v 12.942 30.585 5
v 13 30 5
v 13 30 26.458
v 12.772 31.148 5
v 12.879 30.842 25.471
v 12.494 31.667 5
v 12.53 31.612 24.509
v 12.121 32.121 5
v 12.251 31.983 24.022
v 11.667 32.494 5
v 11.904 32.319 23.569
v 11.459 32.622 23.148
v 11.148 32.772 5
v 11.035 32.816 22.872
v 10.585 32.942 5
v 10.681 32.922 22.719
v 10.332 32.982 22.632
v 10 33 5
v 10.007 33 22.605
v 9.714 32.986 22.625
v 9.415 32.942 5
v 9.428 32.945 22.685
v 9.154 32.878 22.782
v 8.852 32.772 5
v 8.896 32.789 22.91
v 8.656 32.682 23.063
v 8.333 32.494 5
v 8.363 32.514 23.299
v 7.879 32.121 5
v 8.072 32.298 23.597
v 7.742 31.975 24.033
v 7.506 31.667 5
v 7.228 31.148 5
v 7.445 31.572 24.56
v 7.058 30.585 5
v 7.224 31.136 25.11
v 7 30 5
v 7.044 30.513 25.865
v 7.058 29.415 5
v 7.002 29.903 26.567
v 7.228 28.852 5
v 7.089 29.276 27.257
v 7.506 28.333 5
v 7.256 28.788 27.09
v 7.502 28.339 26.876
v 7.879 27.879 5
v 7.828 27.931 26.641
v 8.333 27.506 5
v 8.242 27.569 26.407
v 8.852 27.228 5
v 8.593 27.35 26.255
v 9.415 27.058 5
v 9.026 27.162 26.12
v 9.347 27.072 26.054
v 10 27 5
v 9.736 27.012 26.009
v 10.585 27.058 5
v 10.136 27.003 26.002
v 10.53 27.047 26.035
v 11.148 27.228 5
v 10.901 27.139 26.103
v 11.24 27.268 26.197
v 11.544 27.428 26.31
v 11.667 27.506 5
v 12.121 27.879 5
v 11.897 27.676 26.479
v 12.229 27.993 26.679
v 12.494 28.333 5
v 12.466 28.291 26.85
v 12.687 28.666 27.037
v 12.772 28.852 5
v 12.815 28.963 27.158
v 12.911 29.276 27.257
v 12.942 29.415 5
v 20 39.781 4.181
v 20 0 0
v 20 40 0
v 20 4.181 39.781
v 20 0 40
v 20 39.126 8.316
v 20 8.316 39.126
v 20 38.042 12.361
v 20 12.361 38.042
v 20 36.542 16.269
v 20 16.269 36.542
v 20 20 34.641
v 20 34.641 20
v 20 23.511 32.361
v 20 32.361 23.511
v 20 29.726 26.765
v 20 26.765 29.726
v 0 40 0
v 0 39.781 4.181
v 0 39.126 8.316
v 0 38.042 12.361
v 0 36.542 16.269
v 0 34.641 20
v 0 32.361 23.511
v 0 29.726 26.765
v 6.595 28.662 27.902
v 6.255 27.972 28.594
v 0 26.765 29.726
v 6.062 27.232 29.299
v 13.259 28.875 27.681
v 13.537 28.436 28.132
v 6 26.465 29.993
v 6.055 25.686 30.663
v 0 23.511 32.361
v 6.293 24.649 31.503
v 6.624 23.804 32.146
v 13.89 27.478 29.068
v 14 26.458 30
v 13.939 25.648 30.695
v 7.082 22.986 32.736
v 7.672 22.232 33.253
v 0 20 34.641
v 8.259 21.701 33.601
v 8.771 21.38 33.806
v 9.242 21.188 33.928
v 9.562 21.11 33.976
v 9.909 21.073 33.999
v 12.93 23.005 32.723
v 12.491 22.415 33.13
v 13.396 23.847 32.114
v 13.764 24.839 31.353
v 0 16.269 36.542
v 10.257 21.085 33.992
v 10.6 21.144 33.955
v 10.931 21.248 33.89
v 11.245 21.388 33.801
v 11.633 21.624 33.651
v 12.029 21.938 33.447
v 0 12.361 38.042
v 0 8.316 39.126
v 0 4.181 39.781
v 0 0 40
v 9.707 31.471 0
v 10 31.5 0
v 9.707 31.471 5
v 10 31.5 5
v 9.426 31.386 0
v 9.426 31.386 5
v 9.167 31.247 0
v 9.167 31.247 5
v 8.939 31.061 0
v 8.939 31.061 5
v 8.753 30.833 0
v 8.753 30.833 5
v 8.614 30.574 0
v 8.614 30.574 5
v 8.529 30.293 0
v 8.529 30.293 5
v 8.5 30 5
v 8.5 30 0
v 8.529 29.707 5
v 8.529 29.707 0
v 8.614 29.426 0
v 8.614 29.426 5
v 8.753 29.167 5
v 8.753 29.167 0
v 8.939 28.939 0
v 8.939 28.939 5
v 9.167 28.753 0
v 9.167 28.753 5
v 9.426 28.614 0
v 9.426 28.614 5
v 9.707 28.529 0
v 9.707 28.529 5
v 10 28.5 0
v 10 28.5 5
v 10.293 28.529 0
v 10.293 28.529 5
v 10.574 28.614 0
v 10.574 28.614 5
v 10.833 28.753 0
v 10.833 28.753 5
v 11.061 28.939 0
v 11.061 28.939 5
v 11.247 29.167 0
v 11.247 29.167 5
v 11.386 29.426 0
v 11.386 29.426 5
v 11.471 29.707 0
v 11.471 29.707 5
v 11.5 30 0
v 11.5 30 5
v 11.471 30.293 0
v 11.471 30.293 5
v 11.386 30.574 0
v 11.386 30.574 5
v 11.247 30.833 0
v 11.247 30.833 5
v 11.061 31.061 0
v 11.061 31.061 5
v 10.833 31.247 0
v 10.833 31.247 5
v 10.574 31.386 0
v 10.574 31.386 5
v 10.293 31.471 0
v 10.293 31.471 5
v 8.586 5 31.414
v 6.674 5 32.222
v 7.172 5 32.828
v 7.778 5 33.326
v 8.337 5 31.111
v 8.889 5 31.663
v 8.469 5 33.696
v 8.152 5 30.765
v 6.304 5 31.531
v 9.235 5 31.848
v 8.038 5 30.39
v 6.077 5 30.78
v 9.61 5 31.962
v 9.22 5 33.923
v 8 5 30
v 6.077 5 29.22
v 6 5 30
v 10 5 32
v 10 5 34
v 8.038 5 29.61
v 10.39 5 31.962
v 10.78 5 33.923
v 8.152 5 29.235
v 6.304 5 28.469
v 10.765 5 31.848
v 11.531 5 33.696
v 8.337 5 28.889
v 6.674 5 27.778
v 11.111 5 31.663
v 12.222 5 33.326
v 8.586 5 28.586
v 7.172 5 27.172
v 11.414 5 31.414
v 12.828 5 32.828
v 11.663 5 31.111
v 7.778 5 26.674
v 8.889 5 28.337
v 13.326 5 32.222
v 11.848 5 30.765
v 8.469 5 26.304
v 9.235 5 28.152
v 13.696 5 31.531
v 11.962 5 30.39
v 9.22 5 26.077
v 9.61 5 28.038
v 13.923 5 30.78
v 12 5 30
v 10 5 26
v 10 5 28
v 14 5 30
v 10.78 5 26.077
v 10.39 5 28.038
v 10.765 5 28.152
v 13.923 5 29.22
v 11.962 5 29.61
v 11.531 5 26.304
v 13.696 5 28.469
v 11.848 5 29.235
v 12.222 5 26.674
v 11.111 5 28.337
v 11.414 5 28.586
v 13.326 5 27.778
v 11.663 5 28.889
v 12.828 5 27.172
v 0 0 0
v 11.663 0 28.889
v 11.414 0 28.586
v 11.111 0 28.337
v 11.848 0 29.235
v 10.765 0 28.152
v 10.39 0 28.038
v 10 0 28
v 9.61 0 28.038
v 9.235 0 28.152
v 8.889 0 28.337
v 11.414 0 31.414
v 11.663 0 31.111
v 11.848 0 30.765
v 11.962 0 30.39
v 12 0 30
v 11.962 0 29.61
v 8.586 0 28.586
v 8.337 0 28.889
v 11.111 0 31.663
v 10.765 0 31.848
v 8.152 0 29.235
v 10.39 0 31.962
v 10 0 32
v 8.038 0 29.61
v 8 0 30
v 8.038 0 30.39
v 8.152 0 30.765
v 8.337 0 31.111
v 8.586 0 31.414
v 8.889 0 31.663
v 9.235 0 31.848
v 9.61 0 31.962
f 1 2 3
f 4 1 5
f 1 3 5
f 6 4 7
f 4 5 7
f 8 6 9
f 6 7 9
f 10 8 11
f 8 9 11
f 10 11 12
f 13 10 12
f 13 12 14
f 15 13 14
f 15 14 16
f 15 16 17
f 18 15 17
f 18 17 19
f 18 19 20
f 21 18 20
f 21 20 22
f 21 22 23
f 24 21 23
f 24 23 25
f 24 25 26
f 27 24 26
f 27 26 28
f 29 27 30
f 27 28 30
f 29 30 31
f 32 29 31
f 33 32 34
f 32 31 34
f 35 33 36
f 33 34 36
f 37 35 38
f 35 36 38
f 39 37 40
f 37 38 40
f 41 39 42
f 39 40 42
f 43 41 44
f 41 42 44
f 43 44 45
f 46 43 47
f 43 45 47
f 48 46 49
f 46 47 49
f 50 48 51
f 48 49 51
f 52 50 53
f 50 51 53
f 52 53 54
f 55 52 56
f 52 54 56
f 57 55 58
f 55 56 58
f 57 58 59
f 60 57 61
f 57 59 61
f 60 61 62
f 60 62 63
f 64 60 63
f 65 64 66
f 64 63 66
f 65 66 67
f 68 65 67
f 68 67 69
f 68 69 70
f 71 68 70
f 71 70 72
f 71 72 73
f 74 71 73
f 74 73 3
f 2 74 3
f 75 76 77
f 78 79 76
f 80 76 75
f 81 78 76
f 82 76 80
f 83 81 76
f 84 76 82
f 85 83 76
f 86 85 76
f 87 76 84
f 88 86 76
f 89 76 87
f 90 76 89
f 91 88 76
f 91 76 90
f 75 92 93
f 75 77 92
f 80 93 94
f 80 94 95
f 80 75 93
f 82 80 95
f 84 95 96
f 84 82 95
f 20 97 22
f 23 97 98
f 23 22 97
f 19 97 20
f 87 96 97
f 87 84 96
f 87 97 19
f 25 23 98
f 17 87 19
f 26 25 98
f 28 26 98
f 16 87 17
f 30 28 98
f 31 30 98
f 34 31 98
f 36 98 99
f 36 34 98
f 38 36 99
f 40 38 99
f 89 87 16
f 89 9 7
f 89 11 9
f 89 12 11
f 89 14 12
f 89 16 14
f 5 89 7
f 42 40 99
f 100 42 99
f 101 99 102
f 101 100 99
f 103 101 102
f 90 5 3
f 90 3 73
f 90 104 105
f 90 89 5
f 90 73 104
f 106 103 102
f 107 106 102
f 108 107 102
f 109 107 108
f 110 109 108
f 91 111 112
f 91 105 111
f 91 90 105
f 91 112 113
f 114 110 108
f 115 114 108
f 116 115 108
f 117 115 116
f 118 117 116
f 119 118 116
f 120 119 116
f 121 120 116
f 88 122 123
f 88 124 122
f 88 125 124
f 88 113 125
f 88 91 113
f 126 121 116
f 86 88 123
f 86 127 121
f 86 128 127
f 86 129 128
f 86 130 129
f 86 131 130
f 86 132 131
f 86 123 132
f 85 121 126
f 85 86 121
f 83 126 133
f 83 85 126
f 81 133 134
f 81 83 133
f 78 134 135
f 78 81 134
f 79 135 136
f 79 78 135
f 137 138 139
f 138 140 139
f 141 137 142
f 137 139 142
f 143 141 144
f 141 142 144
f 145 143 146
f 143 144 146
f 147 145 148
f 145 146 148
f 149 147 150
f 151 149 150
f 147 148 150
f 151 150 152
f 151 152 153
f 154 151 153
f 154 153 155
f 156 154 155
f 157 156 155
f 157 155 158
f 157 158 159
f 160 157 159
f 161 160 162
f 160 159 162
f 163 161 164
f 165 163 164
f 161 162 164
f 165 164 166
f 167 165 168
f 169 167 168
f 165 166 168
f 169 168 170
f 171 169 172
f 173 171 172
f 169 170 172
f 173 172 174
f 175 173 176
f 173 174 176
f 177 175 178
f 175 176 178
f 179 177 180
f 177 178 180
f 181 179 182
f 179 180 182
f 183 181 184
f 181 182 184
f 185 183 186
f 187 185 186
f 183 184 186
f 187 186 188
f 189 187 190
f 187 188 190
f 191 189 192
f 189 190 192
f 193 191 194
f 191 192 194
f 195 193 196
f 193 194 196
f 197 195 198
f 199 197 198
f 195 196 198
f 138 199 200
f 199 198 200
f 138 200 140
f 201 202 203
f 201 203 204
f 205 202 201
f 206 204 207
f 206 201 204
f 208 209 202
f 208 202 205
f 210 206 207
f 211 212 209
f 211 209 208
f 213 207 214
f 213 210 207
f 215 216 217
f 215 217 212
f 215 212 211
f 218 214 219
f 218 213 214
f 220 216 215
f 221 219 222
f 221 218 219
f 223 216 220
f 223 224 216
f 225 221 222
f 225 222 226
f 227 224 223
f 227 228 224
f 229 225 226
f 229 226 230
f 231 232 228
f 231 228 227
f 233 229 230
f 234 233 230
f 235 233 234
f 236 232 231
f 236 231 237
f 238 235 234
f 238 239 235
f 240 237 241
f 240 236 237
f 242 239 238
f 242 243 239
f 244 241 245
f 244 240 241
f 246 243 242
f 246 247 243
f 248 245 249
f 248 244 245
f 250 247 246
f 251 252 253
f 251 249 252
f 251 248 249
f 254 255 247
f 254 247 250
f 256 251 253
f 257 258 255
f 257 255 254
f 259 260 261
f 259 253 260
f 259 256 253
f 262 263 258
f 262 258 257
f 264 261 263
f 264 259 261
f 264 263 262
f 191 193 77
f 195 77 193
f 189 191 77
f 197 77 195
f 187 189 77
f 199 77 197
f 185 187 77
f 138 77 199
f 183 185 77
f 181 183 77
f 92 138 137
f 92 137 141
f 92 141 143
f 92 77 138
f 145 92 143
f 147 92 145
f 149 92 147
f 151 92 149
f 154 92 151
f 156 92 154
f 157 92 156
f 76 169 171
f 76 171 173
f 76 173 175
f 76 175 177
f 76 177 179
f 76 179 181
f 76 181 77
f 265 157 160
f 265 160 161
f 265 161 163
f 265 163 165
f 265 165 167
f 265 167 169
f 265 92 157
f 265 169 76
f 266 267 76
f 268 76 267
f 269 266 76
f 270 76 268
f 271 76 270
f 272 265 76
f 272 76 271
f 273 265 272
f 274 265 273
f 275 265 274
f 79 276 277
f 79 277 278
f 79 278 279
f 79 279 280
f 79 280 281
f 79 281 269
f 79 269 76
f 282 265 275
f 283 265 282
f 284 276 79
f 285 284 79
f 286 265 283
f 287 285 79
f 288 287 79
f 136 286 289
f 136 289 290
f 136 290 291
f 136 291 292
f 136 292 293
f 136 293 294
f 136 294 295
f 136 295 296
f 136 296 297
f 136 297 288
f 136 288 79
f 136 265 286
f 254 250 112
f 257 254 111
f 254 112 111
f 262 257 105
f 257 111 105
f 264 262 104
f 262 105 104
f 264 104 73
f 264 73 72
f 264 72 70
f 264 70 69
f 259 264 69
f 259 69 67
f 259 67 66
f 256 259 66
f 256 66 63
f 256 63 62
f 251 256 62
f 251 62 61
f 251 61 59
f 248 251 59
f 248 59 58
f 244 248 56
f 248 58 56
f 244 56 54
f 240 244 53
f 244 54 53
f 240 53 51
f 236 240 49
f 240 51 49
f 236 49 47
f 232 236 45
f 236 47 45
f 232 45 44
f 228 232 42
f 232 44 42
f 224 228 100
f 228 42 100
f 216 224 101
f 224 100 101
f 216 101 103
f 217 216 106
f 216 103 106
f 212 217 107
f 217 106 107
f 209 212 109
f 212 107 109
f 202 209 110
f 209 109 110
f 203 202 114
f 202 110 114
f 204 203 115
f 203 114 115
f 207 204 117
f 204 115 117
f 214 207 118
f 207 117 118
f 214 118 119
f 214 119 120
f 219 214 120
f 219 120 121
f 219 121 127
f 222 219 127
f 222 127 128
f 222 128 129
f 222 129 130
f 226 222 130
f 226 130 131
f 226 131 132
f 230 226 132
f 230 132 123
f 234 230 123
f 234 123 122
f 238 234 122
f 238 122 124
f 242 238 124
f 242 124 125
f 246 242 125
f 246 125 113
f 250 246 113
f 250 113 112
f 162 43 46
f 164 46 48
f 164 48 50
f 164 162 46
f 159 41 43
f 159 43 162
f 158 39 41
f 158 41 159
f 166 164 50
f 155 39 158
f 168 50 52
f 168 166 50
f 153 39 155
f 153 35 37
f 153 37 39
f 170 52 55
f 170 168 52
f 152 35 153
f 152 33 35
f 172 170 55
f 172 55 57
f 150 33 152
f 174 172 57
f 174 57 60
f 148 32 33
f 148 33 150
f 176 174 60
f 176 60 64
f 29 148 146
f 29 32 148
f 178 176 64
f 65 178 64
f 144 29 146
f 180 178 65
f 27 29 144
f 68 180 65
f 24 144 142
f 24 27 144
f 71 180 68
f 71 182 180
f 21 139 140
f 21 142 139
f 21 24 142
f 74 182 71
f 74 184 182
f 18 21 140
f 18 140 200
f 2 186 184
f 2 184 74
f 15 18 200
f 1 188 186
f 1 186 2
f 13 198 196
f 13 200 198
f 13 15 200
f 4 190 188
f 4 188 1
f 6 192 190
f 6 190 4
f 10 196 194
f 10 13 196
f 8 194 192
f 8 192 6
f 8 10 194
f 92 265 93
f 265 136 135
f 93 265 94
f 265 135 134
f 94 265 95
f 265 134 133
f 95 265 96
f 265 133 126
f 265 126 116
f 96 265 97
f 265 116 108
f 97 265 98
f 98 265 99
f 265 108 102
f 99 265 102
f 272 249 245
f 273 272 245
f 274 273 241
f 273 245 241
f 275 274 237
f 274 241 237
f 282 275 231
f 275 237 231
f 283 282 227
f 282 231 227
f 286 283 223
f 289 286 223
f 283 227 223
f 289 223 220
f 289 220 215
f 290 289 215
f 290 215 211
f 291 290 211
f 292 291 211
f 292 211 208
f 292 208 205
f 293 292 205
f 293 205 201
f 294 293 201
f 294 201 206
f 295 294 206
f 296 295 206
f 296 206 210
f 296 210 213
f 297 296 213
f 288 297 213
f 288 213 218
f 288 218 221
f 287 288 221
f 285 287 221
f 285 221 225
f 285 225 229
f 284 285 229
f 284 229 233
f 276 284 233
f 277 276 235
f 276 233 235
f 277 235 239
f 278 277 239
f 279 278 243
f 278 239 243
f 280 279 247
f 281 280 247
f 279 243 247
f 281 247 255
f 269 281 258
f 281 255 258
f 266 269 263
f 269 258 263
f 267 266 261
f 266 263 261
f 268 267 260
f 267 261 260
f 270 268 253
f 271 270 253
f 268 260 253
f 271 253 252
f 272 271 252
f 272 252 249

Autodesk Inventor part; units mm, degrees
ref_plane "YZ Plane" through (0, 0, 0) normal (1, 0, 0) x (0, 1, 0)
ref_plane "XZ Plane" through (0, 0, 0) normal (0, 1, 0) x (-1, 0, 0)
ref_plane "XY Plane" through (0, 0, 0) normal (0, 0, 1) x (1, 0, 0)
sketch "草圖1" plane through (0, 0, 0) normal (1, 0, 0) x (0, 1, 0)
  line L0 (0, 0) -> (0, 65)
  line L1 (0, 65) -> (65, 0)
  line L2 (65, 0) -> (0, 0)
  line L3 (10, 55) -> (0, 55)
  line L4 (55, 10) -> (55, 0)
  line L5 (55, 10) -> (55, 55)
  line L6 (55, 55) -> (10, 55)
  dimension "d0" = 65
  dimension "d1" = 65
  dimension "d20" = 55
extrude "擠出1" add sketch "草圖1" along normal blind 20 contours L0 L3 L1 L4 L2 | L6 L5 L1
sketch "草圖2" plane through (0, 0, 0) normal (0, -1, 0) x (1, 0, 0)
  line L0 (0, 0) -> (20, 0) projected
  point P0 (10, 30)
  point P1 (10, 0)
  dimension "d4" = 30
hole "孔1" at (10, 0, 30) direction (0, 1, 0) diameter 4 end through all
sketch "草圖3" plane through (0, 0, 0) normal (0, 0, -1) x (-1, 0, 0)
  line L0 (0, 0) -> (-20, 0) projected
  point P0 (-10, 30)
  point P1 (-10, 0)
  dimension "d12" = 30
hole "孔2" at (10, 30, 0) direction (0, 0, 1) diameter 3 end through all
sketch "草圖6" plane through (0, 55, 55) normal (0, 1, 0) x (1, 0, 0)
  circle A0 centre (10, 25) radius 2 projected
  circle A1 centre (10, 25) radius 4
  point P0 (0, 55)
  dimension "d27" = 8
extrude "擠出4" cut sketch "草圖6" against normal blind 50
sketch "草圖7" plane through (0, 0, 55) normal (0, 0, 1) x (1, 0, 0)
  circle A0 centre (10, 30) radius 1.5 projected
  circle A1 centre (10, 30) radius 1.5 projected
  circle A2 centre (10, 30) radius 3
  point P0 (0, 0)
  dimension "d30" = 6
extrude "擠出5" cut sketch "草圖7" against normal blind 50
sketch "草圖8" plane through (20, 0, 0) normal (1, 0, 0) x (0, 0, -1)
  line L0 (0, 0) -> (0, 55) projected
  line L1 (-55, 0) -> (0, 0) projected
  arc A0 (0, 40) -> (-40, 0) centre (0, 0) ccw
  line L2 (-55, 55) -> (-55, 0) projected
  line L3 (-55, 0) -> (0, 0) projected
  line L4 (0, 0) -> (0, 55) projected
  line L5 (0, 55) -> (-55, 55) projected
  dimension "d34" = 40
extrude "擠出6" cut sketch "草圖8" against normal through all contours A0 L1 L2 L5 L0
equation "\"d1\" = d0"
properties part number "鋁擠固定器"
